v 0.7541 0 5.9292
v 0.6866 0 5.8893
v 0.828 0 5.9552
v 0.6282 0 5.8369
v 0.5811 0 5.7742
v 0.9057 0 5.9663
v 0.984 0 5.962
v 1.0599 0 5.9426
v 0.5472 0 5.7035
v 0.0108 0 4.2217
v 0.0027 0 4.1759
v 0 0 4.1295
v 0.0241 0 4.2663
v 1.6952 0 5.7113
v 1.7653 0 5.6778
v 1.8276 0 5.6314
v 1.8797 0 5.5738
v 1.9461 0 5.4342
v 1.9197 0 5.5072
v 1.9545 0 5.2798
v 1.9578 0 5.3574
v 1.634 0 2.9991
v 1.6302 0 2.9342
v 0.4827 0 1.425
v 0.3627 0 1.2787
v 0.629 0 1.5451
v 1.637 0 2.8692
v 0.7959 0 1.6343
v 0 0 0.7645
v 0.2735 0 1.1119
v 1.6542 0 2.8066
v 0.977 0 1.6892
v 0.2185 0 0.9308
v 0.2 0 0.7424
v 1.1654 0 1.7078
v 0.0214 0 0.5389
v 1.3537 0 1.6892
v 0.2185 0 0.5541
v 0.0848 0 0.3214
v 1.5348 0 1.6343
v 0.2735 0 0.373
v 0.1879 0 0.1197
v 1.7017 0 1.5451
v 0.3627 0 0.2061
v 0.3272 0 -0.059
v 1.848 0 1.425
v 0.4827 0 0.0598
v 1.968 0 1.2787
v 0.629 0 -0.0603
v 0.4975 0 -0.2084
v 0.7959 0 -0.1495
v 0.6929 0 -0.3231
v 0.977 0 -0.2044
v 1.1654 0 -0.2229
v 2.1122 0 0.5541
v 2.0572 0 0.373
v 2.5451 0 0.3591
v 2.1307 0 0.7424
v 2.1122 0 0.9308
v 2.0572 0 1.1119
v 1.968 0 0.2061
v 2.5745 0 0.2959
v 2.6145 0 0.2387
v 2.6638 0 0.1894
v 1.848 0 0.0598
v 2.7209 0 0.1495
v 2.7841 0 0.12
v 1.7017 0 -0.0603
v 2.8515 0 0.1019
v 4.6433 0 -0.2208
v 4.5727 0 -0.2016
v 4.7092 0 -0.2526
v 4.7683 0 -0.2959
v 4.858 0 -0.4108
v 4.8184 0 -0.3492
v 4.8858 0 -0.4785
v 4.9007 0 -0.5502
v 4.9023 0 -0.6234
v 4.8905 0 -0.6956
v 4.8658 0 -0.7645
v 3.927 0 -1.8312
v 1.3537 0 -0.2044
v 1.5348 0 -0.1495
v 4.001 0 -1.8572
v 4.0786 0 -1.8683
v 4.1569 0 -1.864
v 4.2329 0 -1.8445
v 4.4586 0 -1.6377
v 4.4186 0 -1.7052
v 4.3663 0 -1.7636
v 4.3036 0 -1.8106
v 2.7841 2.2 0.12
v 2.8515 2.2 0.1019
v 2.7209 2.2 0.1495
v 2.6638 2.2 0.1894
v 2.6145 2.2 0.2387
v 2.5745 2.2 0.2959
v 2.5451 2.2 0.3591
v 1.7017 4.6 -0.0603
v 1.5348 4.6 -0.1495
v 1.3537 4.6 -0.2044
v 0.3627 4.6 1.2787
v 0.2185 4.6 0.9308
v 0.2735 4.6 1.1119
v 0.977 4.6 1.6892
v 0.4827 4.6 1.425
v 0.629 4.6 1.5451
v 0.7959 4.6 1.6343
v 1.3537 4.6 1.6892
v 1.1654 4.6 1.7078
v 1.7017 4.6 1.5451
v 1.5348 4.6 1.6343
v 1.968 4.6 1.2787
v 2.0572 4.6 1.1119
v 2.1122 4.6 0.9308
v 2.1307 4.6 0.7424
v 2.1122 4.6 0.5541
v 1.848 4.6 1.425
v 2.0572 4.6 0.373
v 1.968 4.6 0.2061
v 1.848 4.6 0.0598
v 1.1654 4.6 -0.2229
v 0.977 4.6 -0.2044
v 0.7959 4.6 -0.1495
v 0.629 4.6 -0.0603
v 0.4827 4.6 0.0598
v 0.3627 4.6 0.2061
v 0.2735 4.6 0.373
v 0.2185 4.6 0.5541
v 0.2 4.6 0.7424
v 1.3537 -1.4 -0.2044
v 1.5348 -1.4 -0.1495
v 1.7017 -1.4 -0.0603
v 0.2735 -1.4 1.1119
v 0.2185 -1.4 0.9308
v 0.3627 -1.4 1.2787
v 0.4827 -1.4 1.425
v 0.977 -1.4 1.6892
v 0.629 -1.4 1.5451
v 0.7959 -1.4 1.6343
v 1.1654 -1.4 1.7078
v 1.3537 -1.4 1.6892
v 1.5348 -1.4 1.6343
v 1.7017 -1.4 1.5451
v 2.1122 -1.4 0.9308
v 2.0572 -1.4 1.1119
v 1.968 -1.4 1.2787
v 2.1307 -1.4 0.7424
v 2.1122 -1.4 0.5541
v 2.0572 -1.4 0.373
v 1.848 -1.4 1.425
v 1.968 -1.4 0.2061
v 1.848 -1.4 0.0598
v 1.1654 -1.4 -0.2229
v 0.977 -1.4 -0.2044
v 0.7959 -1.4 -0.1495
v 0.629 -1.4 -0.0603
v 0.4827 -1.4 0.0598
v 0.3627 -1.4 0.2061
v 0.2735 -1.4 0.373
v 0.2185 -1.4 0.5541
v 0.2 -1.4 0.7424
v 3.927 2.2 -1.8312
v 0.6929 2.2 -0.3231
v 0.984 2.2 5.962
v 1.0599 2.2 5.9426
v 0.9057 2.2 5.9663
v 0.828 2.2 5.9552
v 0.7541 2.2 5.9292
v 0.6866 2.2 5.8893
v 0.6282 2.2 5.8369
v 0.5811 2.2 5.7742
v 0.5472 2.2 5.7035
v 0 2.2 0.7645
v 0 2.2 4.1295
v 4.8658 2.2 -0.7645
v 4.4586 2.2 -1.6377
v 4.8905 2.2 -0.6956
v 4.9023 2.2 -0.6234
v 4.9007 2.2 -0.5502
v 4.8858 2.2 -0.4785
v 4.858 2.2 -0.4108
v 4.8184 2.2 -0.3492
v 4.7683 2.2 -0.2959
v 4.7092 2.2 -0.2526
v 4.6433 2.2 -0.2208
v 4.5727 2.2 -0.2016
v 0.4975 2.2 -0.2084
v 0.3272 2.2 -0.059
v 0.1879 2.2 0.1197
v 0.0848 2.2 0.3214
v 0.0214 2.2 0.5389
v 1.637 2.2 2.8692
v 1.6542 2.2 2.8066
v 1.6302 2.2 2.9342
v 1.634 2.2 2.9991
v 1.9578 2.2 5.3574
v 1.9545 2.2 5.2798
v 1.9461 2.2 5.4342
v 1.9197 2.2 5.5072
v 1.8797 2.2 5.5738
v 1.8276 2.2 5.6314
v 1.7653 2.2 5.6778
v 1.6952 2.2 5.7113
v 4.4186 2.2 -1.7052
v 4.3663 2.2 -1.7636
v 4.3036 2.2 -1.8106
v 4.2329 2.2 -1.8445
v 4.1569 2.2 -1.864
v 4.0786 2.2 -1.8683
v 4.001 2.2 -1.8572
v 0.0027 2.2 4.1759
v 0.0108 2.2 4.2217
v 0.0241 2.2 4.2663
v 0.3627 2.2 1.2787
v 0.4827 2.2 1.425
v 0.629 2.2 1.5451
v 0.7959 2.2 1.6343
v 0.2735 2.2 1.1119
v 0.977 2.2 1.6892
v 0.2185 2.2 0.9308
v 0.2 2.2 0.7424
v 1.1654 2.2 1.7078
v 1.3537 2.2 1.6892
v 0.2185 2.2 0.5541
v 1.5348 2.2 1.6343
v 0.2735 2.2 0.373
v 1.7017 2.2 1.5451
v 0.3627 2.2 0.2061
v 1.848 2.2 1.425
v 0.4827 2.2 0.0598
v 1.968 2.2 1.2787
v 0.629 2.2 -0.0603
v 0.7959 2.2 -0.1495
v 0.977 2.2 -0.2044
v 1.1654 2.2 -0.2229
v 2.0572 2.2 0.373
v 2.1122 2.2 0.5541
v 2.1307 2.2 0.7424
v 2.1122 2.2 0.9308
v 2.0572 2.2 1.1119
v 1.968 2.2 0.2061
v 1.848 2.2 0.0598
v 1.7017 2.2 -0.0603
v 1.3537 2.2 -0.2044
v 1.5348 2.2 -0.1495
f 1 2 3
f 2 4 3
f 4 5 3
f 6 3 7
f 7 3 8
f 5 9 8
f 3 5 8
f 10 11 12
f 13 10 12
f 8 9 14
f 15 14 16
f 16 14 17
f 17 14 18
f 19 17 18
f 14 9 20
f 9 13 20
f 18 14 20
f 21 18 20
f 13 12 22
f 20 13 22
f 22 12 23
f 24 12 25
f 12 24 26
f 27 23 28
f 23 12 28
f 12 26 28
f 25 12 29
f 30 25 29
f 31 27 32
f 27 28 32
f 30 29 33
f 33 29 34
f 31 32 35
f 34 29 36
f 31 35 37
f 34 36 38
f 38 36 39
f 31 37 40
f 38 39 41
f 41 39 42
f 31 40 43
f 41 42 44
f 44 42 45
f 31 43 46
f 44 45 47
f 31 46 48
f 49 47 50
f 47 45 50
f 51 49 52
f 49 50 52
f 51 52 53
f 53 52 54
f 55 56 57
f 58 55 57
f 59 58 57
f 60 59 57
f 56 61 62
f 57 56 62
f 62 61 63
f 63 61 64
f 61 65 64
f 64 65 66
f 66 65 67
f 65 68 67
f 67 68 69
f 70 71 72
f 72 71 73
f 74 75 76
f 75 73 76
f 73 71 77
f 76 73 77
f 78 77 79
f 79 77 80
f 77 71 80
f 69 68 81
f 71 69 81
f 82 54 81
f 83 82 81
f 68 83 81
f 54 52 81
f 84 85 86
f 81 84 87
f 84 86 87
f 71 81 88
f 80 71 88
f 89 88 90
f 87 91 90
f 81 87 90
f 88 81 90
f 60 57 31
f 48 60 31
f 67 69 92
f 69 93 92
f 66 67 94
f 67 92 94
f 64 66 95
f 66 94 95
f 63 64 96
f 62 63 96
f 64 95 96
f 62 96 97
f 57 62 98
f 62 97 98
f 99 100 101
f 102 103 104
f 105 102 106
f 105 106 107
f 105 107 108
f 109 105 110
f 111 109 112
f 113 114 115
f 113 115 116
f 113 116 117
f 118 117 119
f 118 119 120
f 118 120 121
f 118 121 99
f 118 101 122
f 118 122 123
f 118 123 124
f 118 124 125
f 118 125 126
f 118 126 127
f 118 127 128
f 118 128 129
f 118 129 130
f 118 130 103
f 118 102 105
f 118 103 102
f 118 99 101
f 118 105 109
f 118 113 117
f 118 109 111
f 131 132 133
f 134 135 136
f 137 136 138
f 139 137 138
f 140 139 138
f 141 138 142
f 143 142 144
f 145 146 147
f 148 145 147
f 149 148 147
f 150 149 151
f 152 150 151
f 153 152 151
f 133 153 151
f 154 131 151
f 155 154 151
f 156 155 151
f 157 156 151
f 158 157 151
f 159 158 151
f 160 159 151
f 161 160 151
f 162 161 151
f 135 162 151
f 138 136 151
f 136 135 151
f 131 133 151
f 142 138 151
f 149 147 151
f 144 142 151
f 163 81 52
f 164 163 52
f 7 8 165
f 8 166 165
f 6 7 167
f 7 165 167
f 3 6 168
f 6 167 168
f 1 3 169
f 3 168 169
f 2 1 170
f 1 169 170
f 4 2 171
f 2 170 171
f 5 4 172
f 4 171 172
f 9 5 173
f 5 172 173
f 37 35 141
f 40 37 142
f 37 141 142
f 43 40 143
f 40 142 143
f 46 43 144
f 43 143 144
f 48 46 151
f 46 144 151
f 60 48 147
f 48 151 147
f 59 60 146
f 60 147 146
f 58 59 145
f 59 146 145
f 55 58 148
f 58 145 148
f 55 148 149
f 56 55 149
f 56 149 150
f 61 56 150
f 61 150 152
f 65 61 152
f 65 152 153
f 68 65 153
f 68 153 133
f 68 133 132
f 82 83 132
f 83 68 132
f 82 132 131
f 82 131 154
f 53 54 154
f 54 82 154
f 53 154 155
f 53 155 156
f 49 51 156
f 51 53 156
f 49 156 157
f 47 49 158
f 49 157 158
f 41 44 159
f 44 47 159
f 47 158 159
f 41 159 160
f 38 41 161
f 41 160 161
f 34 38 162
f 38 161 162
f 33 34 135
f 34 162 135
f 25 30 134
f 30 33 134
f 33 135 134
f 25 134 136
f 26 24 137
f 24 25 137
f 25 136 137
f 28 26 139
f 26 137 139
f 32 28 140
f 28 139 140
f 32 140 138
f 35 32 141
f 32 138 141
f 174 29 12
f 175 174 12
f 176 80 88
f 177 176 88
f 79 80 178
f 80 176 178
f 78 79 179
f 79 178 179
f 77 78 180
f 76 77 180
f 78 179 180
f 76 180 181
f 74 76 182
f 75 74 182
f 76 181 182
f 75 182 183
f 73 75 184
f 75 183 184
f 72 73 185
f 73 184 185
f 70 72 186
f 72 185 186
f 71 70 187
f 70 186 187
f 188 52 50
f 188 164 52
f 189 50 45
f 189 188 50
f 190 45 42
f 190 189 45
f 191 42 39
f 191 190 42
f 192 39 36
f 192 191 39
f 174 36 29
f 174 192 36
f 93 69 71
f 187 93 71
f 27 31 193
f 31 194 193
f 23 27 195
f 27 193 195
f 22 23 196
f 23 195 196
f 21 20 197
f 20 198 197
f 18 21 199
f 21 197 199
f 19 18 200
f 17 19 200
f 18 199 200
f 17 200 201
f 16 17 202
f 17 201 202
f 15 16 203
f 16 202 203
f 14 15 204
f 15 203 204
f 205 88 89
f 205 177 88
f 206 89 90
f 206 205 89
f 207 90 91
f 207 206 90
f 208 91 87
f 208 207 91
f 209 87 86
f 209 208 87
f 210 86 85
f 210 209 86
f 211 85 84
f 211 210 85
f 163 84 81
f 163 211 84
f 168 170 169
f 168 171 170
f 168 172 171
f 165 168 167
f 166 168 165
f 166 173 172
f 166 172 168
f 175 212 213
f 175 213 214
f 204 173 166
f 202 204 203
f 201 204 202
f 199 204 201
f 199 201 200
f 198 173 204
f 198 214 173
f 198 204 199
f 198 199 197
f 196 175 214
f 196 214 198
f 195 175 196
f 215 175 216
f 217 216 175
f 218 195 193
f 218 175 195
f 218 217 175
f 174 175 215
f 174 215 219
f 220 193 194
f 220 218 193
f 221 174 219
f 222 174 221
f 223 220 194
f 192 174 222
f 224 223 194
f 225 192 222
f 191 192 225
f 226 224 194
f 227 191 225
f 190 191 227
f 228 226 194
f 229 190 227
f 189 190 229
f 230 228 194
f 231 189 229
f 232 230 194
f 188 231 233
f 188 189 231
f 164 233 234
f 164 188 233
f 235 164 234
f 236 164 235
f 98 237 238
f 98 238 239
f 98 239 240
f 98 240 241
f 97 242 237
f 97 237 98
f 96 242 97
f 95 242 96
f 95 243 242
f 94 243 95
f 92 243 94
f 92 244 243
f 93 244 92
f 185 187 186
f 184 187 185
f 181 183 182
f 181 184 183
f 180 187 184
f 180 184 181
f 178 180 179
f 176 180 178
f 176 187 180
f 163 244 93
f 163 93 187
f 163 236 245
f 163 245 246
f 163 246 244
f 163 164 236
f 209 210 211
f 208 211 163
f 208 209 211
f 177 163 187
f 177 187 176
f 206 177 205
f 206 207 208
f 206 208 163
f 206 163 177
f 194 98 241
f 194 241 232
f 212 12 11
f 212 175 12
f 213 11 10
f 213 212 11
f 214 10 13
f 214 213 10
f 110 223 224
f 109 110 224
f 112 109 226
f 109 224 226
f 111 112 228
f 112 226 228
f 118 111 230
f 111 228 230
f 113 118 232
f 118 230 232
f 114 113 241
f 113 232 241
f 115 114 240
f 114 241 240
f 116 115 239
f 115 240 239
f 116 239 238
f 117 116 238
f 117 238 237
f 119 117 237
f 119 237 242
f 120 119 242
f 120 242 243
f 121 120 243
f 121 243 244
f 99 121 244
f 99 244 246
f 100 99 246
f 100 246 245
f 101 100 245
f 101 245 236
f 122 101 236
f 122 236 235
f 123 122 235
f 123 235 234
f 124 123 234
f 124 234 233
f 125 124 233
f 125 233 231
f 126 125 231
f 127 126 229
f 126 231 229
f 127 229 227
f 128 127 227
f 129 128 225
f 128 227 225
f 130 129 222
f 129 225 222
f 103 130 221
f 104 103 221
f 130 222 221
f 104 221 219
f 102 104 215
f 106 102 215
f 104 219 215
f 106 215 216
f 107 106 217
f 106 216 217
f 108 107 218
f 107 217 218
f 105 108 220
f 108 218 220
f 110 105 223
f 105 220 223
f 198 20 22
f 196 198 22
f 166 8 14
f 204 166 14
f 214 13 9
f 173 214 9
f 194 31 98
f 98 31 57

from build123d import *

# Parameters (mm, degrees)
BOSS_EXTRUDE3_DEPTH      = 2.2
CHAMFER2_SIZE            = 0.6
CHAMFER2_SIZE_2          = 2.822778066
FILLET1_R                = 0.4
BOSS_EXTRUDE4_DEPTH      = 4.6
BOSS_EXTRUDE4_DEPTH_BACK = 1.4
SKETCH2_R                = 0.965366887
FILLET2_R                = 1.2


with BuildPart() as part:
    # Sketch1 → Boss-Extrude3 (new body)
    with BuildSketch(Plane(origin=(0, 0, 0), x_dir=(1, 0, 0), z_dir=(0, 1, 0))):
        Polygon((5.086064398, 0.292080247), (4.289535013, 2.000243026), (0, 0), (0, -4.2), (0.684040287, -6.079385242), (2.563425528, -5.395344955), (1.63771199, -2.851967912), (2.624045016, -0.142040197), align=None)
    extrude(amount=BOSS_EXTRUDE3_DEPTH)

    # Chamfer2
    # the kernel refuses this chamfer: 2.822778066, 0.6 mm, written as the material it takes off along each edge
    with BuildSketch(Plane(origin=(2.563425528, -7.333289373, 5.395344955), x_dir=(-0.865629936296976, 0, 0.5006843450583344), z_dir=(0, 1, 0))) as chamfer2_piece_1_section:
        Polygon((CHAMFER2_SIZE * 0.984670194927, -CHAMFER2_SIZE * 0.174426509515), (-CHAMFER2_SIZE_2 * 0.174426509496, -CHAMFER2_SIZE_2 * 0.984670194818), (0, 0), align=None)
    chamfer2_piece_1 = extrude(amount=16.866578746, mode=Mode.PRIVATE)
    chamfer2_piece_1 = split(chamfer2_piece_1, bisect_by=Plane(origin=(1.145577622, 1.1, 4.204095975), z_dir=(0.93969262078591, 0, 0.3420201433256644)), keep=Keep.TOP, mode=Mode.PRIVATE)
    add(chamfer2_piece_1, mode=Mode.SUBTRACT)

    # Fillet1
    fillet1_edges = [part.edges().sort_by_distance(p)[0] for p in [
        (4.289535013, 1.1, -2.000243026),
        (5.086064398, 1.1, -0.292080247),
        (2.624045016, 1.1, 0.142040197),
        (0.684040287, 1.1, 6.079385242),
        (0, 1.1, 4.2),
        (1.999609956, 1.1, 5.600557041),
        (1.620115519, 1.1, 2.900313819),
    ]]
    fillet(fillet1_edges, radius=FILLET1_R)

    # Sketch2 → Boss-Extrude4 (add, two sides: drawn at the far end of the back side and taken through both)
    with BuildSketch(Plane(origin=(0, 0, 0), x_dir=(1, 0, 0), z_dir=(0, 1, 0)).offset(-BOSS_EXTRUDE4_DEPTH_BACK)):
        with Locations(Location((1.165366887, -0.742420587, 0), (0, 0, 270))):
            Circle(SKETCH2_R)
    extrude(amount=BOSS_EXTRUDE4_DEPTH + BOSS_EXTRUDE4_DEPTH_BACK)

    # Fillet2
    fillet2_edges = [part.edges().sort_by_distance(p)[0] for p in [
        (0, 1.1, 0),
    ]]
    fillet(fillet2_edges, radius=FILLET2_R)


solid = part.part
